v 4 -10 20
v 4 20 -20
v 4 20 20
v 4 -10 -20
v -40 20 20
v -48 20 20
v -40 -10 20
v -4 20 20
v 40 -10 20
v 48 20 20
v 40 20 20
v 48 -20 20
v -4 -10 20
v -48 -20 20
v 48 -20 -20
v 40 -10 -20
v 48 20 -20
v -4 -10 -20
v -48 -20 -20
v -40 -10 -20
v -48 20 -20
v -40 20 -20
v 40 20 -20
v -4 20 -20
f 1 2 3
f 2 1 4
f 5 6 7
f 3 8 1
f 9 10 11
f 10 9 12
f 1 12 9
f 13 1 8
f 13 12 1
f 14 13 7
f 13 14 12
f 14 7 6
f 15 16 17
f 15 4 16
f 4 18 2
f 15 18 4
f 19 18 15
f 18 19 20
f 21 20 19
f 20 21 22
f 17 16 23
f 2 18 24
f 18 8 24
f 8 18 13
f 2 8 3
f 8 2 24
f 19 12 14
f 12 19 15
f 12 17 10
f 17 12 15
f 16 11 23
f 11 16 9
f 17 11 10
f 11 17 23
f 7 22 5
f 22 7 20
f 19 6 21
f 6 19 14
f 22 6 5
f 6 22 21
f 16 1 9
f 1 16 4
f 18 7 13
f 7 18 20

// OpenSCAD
translate([0,0,0]) cube([8,40,40],center=true);
translate([40+4,0,0]) cube([8,40,40],center=true);
translate([-(40+4),0,0]) cube([8,40,40],center=true);

translate([0,-(40-10)/2,0]) cube([80+16,10,40],center=true);
        
